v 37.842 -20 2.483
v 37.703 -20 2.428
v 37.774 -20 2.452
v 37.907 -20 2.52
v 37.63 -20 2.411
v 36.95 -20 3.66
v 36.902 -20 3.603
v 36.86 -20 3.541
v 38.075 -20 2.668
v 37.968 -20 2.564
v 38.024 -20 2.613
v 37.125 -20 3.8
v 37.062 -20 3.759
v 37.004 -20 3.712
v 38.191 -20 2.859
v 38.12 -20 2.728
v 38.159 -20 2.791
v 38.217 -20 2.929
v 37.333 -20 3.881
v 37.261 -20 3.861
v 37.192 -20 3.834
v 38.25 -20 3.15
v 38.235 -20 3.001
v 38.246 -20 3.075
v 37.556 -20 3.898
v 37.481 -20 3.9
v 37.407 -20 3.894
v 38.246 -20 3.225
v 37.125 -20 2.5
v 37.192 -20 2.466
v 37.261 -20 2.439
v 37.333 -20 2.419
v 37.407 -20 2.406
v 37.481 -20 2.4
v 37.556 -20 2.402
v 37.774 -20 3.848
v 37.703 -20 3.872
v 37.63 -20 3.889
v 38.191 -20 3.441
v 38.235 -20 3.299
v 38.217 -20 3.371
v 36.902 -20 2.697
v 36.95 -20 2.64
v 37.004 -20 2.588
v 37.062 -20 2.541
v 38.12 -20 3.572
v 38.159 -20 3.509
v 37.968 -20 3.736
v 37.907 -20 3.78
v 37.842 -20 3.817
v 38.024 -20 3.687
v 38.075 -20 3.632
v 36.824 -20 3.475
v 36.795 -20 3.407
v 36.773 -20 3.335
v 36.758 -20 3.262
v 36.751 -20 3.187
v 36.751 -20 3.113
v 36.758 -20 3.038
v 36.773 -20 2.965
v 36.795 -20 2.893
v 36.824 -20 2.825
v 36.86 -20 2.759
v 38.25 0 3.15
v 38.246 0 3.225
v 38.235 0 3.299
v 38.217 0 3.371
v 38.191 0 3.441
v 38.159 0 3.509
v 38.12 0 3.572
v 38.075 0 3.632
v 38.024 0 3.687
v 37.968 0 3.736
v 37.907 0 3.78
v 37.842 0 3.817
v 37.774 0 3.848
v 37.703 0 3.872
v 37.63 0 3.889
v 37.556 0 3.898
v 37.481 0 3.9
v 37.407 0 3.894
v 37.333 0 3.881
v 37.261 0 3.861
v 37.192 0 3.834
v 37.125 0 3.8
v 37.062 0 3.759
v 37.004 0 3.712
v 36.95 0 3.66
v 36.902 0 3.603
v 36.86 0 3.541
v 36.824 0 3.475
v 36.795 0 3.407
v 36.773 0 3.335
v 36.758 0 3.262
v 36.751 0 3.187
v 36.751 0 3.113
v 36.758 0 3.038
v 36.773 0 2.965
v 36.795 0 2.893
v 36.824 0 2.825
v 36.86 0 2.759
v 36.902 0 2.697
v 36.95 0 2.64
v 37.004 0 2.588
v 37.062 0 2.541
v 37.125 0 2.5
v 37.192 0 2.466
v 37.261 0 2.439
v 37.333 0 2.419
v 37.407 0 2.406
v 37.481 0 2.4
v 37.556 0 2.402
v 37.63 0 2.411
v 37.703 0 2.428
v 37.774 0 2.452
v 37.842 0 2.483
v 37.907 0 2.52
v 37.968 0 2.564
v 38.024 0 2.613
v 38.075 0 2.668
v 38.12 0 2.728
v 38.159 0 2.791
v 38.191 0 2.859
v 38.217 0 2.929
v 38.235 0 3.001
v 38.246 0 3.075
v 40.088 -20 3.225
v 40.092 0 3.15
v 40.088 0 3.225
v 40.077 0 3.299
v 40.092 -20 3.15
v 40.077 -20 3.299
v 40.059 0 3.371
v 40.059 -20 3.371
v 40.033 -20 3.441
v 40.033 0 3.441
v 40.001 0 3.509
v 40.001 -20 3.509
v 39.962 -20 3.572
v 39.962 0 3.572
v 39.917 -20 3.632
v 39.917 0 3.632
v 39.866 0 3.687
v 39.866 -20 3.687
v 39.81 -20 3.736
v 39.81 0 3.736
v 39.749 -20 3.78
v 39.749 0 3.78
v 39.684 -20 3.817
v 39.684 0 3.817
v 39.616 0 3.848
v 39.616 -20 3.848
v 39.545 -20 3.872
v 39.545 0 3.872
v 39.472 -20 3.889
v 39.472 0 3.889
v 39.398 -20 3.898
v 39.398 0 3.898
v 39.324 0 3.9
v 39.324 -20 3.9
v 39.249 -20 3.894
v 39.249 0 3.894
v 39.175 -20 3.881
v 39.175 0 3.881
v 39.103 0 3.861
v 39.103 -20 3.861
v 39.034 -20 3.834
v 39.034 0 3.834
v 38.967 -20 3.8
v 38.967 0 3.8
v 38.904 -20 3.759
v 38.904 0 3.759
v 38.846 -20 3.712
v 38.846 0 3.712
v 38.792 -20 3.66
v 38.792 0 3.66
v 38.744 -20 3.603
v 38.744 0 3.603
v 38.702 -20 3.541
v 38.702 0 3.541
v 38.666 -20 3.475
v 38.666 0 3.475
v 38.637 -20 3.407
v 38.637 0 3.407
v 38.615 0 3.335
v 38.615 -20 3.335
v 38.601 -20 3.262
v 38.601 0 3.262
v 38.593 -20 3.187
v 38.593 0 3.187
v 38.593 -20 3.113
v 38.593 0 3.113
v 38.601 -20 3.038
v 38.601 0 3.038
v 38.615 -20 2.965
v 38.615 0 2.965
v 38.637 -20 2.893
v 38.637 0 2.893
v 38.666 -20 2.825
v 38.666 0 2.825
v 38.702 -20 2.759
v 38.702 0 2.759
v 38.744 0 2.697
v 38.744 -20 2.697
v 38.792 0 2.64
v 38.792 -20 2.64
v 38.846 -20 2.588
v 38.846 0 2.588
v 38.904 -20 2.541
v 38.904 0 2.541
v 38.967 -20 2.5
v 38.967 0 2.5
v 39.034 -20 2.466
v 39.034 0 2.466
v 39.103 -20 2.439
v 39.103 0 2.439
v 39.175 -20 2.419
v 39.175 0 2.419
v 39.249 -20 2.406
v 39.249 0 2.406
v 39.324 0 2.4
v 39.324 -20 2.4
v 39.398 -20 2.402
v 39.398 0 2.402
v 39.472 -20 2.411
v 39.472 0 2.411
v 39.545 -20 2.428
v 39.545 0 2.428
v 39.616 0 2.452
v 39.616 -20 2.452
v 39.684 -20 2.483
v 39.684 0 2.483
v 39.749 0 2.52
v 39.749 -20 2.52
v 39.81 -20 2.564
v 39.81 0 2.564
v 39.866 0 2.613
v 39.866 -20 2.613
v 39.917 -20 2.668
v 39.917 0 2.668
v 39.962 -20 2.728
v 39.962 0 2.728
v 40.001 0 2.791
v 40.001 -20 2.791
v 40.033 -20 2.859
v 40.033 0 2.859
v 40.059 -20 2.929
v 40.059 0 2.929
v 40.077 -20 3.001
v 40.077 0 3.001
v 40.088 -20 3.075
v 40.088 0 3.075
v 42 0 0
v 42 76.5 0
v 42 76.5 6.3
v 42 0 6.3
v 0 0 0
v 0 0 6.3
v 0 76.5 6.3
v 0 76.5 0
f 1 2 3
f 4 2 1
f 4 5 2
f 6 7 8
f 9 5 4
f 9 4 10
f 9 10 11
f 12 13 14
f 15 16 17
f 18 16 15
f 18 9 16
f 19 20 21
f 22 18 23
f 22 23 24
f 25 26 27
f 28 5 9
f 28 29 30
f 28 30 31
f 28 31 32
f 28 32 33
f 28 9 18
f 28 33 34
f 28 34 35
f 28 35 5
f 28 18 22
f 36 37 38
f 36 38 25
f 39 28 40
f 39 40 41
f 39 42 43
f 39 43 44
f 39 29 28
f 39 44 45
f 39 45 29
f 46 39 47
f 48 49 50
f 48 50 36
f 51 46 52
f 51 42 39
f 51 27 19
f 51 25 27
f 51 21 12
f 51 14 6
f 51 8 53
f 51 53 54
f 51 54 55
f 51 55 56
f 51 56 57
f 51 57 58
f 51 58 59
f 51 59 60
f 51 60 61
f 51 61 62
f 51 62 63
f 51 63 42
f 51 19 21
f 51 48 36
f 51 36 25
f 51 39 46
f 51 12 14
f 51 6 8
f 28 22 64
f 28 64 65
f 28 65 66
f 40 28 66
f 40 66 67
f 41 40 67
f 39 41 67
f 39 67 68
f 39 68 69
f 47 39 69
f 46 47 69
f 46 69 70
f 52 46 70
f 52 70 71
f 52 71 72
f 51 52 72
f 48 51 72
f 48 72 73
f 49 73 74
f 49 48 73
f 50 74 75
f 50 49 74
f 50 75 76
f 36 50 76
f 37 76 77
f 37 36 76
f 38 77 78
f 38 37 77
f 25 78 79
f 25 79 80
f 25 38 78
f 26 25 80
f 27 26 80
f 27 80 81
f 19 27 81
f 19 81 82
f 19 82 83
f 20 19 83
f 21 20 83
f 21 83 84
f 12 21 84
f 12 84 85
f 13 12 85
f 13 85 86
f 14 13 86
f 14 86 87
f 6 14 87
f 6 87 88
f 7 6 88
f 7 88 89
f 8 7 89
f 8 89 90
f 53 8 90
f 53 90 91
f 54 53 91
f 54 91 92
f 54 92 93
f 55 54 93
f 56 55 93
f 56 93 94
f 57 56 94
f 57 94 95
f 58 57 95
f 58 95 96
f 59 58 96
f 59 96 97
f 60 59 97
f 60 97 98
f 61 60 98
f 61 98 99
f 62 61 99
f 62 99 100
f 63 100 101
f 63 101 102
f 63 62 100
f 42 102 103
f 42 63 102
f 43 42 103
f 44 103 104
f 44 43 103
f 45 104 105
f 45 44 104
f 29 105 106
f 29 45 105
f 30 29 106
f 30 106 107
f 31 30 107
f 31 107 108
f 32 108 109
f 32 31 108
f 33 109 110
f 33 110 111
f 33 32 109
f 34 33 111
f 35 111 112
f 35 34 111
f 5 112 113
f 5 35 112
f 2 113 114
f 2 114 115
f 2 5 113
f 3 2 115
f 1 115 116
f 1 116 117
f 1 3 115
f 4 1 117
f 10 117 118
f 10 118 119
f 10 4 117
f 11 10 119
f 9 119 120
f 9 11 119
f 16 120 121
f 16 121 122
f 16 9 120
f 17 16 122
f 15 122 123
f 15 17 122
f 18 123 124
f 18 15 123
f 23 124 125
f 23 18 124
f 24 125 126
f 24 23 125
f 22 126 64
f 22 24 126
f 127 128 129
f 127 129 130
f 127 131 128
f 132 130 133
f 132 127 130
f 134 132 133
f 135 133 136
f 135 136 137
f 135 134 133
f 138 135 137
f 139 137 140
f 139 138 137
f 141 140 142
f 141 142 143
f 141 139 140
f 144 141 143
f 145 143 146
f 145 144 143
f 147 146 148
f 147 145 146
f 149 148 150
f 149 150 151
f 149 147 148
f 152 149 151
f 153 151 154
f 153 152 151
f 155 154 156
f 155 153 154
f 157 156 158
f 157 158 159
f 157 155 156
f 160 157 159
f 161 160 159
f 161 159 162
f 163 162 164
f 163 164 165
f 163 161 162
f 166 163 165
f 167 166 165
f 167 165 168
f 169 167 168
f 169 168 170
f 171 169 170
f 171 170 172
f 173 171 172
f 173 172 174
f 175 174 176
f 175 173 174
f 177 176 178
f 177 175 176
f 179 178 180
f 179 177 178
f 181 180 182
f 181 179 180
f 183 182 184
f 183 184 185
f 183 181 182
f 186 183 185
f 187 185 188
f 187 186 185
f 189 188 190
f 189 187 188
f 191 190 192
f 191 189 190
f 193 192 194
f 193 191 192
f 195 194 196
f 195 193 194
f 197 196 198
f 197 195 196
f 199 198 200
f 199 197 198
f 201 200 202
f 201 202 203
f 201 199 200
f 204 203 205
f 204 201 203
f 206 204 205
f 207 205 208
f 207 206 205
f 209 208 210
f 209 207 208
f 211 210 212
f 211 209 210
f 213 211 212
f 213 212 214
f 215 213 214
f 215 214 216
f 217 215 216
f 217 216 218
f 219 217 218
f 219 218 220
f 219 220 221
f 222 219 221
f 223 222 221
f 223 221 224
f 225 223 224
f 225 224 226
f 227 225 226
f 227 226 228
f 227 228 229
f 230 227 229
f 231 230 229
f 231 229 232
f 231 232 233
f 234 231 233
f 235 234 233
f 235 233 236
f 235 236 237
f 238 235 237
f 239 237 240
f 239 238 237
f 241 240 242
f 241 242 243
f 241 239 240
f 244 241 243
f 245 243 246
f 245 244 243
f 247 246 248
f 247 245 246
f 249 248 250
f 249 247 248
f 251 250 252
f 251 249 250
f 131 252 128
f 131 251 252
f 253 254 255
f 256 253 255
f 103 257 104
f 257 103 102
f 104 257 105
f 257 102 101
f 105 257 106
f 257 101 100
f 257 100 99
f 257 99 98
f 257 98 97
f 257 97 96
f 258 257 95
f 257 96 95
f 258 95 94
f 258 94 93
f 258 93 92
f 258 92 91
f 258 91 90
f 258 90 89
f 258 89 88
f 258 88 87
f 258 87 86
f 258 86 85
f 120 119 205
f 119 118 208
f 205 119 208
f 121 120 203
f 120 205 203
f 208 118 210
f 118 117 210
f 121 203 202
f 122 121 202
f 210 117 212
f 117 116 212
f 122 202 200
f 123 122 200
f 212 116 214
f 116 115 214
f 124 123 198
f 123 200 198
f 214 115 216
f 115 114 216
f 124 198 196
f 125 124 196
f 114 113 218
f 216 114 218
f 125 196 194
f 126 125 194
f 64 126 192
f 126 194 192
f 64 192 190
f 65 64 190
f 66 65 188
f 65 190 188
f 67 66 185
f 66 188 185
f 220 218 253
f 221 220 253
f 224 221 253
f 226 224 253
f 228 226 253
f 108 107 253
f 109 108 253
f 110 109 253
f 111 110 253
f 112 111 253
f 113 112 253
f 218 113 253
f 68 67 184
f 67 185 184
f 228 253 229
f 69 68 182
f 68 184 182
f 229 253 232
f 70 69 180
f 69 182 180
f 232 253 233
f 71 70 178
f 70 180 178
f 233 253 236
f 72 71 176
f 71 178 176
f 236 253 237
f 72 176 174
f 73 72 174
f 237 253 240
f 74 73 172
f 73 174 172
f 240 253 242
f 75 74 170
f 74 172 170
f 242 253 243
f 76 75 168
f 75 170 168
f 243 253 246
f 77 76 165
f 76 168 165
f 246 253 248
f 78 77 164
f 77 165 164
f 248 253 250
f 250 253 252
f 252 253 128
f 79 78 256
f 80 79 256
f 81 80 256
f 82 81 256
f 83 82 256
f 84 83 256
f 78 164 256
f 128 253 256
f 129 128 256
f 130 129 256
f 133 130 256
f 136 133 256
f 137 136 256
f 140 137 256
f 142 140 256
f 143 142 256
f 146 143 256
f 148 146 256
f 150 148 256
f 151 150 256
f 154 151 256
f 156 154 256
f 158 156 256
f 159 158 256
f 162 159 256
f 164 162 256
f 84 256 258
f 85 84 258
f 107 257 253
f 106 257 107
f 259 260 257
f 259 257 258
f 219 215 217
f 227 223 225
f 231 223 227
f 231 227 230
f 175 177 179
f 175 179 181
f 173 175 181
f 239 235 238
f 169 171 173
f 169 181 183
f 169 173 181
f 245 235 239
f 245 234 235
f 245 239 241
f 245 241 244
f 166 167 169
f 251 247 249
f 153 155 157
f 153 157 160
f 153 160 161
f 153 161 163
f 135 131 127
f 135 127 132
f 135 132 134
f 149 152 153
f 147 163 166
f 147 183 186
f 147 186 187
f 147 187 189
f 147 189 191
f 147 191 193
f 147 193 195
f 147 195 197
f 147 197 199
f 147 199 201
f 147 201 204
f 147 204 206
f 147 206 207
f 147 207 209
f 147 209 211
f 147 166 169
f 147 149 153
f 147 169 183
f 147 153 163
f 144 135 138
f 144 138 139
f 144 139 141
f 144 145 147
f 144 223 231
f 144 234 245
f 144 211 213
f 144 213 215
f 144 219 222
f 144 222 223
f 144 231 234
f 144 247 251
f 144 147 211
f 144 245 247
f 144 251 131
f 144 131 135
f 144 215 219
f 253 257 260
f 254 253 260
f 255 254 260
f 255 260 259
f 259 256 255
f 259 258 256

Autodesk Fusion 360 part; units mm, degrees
box "BoxPrimitive1" add length 76.5 width 42 height 6.3 placed x (0, 1, 0) y (-1, 0, 0) z (0, 0, 1) at (42, 0, 0)
cylinder "CylinderPrimitive1" add diameter 1.5 height 20 placed x (1, 0, 0) y (0, 0, 1) z (0, -1, 0) at (39.3422, 0, 3.15)
cylinder "CylinderPrimitive2" add diameter 1.5 height 20 placed x (1, 0, 0) y (0, 0, 1) z (0, -1, 0) at (37.5, 0, 3.15)
